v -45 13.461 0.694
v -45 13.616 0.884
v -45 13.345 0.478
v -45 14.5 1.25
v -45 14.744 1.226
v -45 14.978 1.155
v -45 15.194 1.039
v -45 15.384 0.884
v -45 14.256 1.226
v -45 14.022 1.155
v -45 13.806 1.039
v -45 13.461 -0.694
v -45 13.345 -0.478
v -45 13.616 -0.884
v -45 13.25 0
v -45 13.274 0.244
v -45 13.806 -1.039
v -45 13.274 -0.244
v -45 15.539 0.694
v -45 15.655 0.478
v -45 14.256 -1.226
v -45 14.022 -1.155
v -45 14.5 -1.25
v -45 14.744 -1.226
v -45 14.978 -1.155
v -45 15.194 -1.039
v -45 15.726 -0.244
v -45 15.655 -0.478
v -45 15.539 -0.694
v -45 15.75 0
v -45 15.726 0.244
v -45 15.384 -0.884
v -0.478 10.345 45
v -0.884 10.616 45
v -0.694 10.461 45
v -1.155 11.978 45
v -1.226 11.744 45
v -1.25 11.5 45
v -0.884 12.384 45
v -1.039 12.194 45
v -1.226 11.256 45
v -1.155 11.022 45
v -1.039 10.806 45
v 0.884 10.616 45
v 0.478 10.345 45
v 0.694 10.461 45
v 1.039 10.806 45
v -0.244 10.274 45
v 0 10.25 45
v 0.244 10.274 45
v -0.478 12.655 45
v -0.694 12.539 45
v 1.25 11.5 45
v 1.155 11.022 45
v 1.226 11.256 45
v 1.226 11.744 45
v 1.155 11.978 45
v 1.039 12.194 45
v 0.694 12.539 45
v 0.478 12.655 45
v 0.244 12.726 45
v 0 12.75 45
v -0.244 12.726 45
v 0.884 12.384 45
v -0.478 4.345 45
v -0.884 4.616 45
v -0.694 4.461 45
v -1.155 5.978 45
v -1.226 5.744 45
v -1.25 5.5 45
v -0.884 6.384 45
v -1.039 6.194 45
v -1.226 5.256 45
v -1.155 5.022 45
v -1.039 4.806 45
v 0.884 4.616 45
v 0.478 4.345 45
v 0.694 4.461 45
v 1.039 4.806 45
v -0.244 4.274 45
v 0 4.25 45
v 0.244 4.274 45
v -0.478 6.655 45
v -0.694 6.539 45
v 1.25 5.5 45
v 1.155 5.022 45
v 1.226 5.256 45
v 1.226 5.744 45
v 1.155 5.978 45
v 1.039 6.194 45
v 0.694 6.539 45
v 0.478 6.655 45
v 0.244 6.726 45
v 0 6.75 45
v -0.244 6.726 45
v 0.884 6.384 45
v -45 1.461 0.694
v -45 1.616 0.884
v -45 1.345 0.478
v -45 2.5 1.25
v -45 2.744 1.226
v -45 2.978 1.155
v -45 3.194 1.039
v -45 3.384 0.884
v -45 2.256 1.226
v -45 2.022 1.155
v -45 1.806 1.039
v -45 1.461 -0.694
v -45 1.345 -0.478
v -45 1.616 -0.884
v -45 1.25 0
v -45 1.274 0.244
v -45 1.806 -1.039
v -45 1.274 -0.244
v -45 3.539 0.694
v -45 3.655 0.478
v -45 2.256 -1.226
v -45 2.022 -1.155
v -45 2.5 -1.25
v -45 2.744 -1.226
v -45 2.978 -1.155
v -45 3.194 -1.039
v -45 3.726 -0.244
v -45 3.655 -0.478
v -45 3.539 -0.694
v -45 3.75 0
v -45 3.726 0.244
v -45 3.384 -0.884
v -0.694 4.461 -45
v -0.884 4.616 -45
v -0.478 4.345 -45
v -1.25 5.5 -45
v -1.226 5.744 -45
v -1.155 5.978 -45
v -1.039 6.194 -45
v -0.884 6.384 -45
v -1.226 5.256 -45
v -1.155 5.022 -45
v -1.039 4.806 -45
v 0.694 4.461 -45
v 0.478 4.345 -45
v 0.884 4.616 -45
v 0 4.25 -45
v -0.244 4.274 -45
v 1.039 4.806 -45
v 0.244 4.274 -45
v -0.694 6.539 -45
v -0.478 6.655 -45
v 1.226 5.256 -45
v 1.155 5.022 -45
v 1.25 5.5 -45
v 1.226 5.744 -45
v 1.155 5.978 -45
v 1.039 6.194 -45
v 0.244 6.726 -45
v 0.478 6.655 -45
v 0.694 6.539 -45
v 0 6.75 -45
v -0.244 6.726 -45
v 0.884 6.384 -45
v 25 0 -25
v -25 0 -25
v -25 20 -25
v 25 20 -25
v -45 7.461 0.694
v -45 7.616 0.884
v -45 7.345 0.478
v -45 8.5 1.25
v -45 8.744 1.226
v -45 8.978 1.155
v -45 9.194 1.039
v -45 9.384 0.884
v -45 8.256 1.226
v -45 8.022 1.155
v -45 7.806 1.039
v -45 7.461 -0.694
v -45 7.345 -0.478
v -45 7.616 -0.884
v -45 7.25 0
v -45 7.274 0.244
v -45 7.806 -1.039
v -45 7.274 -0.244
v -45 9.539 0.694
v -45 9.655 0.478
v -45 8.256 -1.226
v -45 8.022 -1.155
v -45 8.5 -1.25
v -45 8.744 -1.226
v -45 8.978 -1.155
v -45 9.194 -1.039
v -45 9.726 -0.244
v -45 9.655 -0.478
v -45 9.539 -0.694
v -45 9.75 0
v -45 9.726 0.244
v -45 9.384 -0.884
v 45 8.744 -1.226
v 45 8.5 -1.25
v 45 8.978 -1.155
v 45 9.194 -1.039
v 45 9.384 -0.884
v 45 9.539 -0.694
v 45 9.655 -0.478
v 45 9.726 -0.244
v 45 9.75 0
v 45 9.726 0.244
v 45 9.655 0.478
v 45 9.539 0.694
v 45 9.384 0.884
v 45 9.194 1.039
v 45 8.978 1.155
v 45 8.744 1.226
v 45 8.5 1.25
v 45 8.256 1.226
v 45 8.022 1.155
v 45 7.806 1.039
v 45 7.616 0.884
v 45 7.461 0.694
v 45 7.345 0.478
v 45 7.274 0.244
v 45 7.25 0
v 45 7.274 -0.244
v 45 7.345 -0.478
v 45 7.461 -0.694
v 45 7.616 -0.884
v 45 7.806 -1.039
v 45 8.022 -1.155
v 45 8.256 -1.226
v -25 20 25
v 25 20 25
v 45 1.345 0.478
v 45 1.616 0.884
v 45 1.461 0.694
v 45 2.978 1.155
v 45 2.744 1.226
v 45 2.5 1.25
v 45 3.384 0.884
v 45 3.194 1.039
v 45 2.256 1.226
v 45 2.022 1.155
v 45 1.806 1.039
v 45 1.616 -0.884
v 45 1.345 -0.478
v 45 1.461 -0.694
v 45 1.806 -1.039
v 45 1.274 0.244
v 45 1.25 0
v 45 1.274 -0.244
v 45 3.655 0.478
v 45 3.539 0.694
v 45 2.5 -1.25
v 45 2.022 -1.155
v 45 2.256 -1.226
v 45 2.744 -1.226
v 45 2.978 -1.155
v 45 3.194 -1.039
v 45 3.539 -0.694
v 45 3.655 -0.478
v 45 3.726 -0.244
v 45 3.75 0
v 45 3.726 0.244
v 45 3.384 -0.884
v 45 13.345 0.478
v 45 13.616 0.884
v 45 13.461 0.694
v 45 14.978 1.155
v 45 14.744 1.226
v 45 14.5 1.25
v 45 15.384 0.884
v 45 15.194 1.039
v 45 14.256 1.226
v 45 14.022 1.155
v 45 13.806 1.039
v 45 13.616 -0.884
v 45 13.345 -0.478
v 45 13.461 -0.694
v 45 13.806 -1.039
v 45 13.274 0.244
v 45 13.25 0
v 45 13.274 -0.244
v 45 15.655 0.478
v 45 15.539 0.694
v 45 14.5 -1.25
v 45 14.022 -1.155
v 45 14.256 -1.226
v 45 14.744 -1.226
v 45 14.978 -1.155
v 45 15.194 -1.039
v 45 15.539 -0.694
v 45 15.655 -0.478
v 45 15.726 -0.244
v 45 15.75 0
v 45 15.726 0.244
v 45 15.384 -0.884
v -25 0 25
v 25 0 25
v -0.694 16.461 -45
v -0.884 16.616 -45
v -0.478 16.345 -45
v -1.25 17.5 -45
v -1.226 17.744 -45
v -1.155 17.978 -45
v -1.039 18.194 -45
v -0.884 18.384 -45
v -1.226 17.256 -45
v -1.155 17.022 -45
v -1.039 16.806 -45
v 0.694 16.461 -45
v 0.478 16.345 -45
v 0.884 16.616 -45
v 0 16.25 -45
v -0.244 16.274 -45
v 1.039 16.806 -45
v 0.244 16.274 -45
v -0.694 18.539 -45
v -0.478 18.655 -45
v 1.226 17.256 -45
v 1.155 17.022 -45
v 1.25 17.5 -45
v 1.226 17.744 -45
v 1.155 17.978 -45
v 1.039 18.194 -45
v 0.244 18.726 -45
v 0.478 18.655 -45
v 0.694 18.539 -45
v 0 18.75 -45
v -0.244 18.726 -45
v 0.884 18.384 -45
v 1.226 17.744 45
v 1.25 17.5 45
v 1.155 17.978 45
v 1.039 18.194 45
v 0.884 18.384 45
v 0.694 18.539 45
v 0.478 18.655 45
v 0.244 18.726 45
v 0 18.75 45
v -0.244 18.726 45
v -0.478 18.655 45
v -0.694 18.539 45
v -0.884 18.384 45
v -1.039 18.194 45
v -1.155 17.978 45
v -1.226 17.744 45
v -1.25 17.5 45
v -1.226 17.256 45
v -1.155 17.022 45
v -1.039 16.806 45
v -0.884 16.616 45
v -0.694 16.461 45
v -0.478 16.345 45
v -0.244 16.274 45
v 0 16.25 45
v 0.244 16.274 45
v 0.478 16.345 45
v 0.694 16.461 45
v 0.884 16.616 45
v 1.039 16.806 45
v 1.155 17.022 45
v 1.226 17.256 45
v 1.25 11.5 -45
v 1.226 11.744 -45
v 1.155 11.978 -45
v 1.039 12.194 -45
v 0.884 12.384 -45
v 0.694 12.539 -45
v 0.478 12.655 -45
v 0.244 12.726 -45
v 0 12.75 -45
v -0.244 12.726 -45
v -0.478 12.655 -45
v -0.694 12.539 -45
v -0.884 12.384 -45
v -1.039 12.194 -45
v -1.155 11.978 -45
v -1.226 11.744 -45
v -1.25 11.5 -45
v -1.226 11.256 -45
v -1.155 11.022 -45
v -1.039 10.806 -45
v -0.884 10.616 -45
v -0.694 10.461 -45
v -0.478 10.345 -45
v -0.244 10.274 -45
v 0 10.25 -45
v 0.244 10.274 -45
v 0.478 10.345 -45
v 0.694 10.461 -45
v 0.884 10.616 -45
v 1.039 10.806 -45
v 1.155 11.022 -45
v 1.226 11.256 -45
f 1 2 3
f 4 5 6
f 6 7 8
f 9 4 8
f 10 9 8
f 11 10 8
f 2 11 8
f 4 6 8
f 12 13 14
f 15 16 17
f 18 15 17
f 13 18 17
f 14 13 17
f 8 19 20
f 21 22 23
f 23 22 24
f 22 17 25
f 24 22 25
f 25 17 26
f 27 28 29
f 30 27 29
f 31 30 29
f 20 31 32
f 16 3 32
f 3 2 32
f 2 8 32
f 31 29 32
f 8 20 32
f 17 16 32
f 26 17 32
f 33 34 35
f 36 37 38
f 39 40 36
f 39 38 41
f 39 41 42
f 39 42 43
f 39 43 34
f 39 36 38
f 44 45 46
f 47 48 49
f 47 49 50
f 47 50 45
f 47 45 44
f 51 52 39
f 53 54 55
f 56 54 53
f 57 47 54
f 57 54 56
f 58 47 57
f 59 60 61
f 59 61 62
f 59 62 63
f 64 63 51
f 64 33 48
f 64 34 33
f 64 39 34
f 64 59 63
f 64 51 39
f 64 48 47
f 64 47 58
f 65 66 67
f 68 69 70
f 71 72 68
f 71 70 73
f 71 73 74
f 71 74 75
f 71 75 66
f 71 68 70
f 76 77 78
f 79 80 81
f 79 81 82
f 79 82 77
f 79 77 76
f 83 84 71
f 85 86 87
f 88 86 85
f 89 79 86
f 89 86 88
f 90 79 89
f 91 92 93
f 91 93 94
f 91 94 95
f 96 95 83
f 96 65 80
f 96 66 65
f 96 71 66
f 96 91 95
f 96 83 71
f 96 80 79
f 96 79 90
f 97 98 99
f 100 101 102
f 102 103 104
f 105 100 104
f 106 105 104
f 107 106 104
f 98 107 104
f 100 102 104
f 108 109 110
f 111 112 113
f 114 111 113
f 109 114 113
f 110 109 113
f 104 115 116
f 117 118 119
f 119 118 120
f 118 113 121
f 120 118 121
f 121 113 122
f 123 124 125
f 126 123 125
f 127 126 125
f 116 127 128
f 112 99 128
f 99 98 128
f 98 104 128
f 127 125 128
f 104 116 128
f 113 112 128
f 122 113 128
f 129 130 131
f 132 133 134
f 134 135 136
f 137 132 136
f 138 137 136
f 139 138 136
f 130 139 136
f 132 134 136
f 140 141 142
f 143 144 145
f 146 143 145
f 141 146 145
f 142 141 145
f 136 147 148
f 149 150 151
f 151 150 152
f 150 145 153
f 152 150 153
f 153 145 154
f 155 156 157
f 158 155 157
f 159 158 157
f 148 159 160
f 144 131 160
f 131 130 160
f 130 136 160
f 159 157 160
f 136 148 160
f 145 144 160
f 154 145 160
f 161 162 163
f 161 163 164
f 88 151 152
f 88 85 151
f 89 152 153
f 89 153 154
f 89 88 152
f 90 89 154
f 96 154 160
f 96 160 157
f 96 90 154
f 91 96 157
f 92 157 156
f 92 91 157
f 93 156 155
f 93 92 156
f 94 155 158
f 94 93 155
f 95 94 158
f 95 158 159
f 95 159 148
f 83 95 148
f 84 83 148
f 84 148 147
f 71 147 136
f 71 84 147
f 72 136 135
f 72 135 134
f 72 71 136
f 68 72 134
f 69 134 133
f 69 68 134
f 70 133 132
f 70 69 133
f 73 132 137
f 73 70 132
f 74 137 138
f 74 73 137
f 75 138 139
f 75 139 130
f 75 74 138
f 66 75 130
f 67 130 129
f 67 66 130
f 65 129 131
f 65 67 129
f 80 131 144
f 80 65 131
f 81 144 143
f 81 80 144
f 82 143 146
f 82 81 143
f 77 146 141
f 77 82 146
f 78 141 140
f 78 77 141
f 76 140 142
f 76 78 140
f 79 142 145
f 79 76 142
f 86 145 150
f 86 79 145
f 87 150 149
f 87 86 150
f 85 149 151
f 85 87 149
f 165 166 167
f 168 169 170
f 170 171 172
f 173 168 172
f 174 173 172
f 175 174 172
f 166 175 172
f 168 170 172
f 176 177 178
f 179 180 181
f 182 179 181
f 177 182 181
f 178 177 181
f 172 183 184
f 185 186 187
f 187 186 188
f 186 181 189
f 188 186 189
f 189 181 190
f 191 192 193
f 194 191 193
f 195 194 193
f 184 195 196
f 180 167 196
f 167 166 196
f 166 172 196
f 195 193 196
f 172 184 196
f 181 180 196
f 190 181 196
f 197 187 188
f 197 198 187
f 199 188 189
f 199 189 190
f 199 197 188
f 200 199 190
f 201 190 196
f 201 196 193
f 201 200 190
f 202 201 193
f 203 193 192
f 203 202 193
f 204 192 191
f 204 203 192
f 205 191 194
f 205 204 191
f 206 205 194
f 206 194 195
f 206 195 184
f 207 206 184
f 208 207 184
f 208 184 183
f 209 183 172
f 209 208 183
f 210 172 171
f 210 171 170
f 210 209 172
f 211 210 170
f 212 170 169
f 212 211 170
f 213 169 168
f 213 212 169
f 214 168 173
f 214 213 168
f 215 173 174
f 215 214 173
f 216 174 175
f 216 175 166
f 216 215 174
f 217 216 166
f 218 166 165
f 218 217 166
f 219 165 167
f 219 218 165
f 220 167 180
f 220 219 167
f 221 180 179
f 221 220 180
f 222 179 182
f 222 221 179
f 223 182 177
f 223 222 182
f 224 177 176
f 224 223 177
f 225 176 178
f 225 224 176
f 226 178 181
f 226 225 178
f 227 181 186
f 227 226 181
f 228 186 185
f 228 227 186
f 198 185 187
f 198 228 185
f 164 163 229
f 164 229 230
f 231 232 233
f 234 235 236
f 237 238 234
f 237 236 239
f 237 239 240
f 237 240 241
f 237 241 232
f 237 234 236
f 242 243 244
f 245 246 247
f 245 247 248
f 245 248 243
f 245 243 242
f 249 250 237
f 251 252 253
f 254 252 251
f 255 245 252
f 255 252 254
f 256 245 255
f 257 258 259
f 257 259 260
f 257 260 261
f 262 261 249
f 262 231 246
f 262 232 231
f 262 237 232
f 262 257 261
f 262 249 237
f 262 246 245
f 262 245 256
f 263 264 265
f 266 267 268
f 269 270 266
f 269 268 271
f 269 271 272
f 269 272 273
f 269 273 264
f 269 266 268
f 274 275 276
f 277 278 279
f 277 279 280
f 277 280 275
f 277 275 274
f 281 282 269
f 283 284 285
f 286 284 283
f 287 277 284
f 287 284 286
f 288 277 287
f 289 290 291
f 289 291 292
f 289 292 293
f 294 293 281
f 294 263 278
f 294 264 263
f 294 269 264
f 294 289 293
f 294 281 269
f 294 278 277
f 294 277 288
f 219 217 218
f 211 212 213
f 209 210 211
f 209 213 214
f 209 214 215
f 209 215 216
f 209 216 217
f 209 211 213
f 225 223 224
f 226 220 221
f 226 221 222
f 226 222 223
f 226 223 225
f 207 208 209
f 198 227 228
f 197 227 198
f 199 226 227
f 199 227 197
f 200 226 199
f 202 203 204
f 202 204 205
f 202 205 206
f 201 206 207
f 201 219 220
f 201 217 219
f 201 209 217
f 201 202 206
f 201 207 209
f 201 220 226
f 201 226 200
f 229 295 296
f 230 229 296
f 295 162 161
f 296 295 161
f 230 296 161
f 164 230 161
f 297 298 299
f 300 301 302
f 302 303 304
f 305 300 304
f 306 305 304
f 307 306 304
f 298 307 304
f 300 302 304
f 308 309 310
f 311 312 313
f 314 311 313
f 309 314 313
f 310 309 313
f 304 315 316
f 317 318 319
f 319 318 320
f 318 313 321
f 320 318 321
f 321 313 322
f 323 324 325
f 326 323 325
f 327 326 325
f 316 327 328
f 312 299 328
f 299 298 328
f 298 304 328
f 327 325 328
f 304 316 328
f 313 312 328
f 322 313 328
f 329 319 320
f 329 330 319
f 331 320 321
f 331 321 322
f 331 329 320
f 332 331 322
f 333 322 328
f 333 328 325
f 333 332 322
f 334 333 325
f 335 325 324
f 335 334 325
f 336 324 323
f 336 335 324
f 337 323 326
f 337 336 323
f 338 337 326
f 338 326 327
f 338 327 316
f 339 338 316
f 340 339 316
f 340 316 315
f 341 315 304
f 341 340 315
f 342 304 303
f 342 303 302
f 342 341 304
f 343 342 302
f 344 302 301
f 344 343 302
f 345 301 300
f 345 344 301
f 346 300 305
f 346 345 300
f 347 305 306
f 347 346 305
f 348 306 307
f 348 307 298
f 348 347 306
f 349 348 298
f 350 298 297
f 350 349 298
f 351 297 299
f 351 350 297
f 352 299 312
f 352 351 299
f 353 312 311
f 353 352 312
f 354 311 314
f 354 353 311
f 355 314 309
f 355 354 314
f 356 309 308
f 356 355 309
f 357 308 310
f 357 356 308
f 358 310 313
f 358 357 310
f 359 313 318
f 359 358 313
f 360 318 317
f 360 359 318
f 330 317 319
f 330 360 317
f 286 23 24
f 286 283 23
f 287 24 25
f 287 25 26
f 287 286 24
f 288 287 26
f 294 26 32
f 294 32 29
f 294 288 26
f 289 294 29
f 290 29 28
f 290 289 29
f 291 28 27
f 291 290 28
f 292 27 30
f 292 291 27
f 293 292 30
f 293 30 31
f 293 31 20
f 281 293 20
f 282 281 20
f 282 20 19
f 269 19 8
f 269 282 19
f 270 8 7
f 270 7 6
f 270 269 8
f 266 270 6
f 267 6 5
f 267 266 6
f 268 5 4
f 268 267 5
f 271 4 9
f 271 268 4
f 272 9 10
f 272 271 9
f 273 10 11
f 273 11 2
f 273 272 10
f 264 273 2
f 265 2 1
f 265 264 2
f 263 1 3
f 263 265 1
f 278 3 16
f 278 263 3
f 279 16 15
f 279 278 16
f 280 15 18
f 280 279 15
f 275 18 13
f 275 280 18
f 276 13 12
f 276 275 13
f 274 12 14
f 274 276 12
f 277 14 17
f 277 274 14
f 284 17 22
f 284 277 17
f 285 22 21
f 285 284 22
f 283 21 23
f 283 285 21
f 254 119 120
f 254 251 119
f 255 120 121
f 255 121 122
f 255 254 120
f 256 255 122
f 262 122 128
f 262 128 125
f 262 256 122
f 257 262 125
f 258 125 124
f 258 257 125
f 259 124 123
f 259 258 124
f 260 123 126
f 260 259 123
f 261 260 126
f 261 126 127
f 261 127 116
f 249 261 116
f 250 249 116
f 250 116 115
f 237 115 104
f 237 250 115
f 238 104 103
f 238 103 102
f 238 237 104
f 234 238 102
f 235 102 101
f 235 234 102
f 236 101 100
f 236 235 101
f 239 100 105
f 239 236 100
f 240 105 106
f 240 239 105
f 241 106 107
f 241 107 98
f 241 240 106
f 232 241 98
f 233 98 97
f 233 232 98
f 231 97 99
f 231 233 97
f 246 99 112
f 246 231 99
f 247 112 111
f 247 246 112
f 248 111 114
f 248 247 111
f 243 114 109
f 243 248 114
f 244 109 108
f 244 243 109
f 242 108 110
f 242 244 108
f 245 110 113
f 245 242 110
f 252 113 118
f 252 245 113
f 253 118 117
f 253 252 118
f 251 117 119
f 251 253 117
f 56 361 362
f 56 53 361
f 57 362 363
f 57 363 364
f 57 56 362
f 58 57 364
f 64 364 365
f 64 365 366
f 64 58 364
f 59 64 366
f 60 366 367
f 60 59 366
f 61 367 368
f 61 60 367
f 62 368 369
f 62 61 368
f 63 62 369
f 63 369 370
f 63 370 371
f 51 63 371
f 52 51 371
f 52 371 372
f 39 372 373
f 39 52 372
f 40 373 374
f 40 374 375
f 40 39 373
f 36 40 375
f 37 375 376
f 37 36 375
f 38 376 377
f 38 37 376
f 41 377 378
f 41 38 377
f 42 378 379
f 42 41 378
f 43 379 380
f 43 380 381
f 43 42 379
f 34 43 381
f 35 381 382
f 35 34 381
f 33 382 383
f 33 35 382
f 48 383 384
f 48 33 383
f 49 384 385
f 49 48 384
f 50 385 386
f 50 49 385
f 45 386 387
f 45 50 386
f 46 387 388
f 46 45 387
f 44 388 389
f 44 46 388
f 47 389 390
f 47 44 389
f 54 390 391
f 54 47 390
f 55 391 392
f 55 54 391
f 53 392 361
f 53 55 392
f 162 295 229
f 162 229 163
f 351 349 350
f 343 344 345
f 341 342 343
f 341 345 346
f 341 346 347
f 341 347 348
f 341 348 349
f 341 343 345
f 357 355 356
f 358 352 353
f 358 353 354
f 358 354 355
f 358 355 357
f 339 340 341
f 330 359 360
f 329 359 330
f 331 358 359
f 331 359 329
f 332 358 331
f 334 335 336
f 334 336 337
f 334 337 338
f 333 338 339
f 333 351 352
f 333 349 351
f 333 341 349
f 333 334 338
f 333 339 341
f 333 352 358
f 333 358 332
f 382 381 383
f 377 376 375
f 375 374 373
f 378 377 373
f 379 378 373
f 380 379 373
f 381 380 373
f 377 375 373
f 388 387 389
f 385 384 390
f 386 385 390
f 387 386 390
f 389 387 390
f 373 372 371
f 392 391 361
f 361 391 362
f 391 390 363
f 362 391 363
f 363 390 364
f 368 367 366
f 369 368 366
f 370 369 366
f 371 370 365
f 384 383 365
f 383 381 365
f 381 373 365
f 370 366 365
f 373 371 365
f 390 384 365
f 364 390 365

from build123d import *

# Parameters (mm, degrees)
SKETCH1_W                  = 50
SKETCH1_H                  = 50
BOSS_EXTRUDE1_DEPTH        = 20
SKETCH2_R                  = 1.25
BOSS_EXTRUDE2_DEPTH        = 20
BOSS_EXTRUDE2_DEPTH_BACK   = 70
BOSS_EXTRUDE2_2_DEPTH      = 20
BOSS_EXTRUDE2_2_DEPTH_BACK = 70
BOSS_EXTRUDE2_3_DEPTH      = 20
BOSS_EXTRUDE2_3_DEPTH_BACK = 70
SKETCH3_R                  = 1.25
BOSS_EXTRUDE3_DEPTH        = 20
BOSS_EXTRUDE3_DEPTH_BACK   = 70
BOSS_EXTRUDE3_2_DEPTH      = 20
BOSS_EXTRUDE3_2_DEPTH_BACK = 70
BOSS_EXTRUDE3_3_DEPTH      = 20
BOSS_EXTRUDE3_3_DEPTH_BACK = 70


with BuildPart() as part:
    # Sketch1 → Boss-Extrude1 (new body)
    with BuildSketch(Plane(origin=(0, 0, 0), x_dir=(1, 0, 0), z_dir=(0, 1, 0))):
        Rectangle(SKETCH1_W, SKETCH1_H)
    extrude(amount=BOSS_EXTRUDE1_DEPTH)


with BuildPart() as body_2:
    # Sketch2 → Boss-Extrude2 (new body, two sides)
    with BuildSketch(Plane.XY.offset(25)) as boss_extrude2_sk:
        with Locations((0, 17.5)):
            Circle(SKETCH2_R)
    extrude(amount=BOSS_EXTRUDE2_DEPTH)
    extrude(boss_extrude2_sk.sketch, amount=-BOSS_EXTRUDE2_DEPTH_BACK)


with BuildPart() as body_3:
    # Sketch2 → Boss-Extrude2 2 (new body, two sides)
    with BuildSketch(Plane.XY.offset(25)) as boss_extrude2_2_sk:
        with Locations((0, 11.5)):
            Circle(SKETCH2_R)
    extrude(amount=BOSS_EXTRUDE2_2_DEPTH)
    extrude(boss_extrude2_2_sk.sketch, amount=-BOSS_EXTRUDE2_2_DEPTH_BACK)


with BuildPart() as body_4:
    # Sketch2 → Boss-Extrude2 3 (new body, two sides)
    with BuildSketch(Plane.XY.offset(25)) as boss_extrude2_3_sk:
        with Locations((0, 5.5)):
            Circle(SKETCH2_R)
    extrude(amount=BOSS_EXTRUDE2_3_DEPTH)
    extrude(boss_extrude2_3_sk.sketch, amount=-BOSS_EXTRUDE2_3_DEPTH_BACK)


with BuildPart() as body_5:
    # Sketch3 → Boss-Extrude3 (new body, two sides)
    with BuildSketch(Plane(origin=(25, 0, 0), x_dir=(0, 0, -1), z_dir=(1, 0, 0))) as boss_extrude3_sk:
        with Locations((0, 14.5)):
            Circle(SKETCH3_R)
    extrude(amount=BOSS_EXTRUDE3_DEPTH)
    extrude(boss_extrude3_sk.sketch, amount=-BOSS_EXTRUDE3_DEPTH_BACK)


with BuildPart() as body_6:
    # Sketch3 → Boss-Extrude3 2 (new body, two sides)
    with BuildSketch(Plane(origin=(25, 0, 0), x_dir=(0, 0, -1), z_dir=(1, 0, 0))) as boss_extrude3_2_sk:
        with Locations((0, 8.5)):
            Circle(SKETCH3_R)
    extrude(amount=BOSS_EXTRUDE3_2_DEPTH)
    extrude(boss_extrude3_2_sk.sketch, amount=-BOSS_EXTRUDE3_2_DEPTH_BACK)


with BuildPart() as body_7:
    # Sketch3 → Boss-Extrude3 3 (new body, two sides)
    with BuildSketch(Plane(origin=(25, 0, 0), x_dir=(0, 0, -1), z_dir=(1, 0, 0))) as boss_extrude3_3_sk:
        with Locations((0, 2.5)):
            Circle(SKETCH3_R)
    extrude(amount=BOSS_EXTRUDE3_3_DEPTH)
    extrude(boss_extrude3_3_sk.sketch, amount=-BOSS_EXTRUDE3_3_DEPTH_BACK)


solid = Compound([part.part, body_2.part, body_3.part, body_4.part, body_5.part, body_6.part, body_7.part])
